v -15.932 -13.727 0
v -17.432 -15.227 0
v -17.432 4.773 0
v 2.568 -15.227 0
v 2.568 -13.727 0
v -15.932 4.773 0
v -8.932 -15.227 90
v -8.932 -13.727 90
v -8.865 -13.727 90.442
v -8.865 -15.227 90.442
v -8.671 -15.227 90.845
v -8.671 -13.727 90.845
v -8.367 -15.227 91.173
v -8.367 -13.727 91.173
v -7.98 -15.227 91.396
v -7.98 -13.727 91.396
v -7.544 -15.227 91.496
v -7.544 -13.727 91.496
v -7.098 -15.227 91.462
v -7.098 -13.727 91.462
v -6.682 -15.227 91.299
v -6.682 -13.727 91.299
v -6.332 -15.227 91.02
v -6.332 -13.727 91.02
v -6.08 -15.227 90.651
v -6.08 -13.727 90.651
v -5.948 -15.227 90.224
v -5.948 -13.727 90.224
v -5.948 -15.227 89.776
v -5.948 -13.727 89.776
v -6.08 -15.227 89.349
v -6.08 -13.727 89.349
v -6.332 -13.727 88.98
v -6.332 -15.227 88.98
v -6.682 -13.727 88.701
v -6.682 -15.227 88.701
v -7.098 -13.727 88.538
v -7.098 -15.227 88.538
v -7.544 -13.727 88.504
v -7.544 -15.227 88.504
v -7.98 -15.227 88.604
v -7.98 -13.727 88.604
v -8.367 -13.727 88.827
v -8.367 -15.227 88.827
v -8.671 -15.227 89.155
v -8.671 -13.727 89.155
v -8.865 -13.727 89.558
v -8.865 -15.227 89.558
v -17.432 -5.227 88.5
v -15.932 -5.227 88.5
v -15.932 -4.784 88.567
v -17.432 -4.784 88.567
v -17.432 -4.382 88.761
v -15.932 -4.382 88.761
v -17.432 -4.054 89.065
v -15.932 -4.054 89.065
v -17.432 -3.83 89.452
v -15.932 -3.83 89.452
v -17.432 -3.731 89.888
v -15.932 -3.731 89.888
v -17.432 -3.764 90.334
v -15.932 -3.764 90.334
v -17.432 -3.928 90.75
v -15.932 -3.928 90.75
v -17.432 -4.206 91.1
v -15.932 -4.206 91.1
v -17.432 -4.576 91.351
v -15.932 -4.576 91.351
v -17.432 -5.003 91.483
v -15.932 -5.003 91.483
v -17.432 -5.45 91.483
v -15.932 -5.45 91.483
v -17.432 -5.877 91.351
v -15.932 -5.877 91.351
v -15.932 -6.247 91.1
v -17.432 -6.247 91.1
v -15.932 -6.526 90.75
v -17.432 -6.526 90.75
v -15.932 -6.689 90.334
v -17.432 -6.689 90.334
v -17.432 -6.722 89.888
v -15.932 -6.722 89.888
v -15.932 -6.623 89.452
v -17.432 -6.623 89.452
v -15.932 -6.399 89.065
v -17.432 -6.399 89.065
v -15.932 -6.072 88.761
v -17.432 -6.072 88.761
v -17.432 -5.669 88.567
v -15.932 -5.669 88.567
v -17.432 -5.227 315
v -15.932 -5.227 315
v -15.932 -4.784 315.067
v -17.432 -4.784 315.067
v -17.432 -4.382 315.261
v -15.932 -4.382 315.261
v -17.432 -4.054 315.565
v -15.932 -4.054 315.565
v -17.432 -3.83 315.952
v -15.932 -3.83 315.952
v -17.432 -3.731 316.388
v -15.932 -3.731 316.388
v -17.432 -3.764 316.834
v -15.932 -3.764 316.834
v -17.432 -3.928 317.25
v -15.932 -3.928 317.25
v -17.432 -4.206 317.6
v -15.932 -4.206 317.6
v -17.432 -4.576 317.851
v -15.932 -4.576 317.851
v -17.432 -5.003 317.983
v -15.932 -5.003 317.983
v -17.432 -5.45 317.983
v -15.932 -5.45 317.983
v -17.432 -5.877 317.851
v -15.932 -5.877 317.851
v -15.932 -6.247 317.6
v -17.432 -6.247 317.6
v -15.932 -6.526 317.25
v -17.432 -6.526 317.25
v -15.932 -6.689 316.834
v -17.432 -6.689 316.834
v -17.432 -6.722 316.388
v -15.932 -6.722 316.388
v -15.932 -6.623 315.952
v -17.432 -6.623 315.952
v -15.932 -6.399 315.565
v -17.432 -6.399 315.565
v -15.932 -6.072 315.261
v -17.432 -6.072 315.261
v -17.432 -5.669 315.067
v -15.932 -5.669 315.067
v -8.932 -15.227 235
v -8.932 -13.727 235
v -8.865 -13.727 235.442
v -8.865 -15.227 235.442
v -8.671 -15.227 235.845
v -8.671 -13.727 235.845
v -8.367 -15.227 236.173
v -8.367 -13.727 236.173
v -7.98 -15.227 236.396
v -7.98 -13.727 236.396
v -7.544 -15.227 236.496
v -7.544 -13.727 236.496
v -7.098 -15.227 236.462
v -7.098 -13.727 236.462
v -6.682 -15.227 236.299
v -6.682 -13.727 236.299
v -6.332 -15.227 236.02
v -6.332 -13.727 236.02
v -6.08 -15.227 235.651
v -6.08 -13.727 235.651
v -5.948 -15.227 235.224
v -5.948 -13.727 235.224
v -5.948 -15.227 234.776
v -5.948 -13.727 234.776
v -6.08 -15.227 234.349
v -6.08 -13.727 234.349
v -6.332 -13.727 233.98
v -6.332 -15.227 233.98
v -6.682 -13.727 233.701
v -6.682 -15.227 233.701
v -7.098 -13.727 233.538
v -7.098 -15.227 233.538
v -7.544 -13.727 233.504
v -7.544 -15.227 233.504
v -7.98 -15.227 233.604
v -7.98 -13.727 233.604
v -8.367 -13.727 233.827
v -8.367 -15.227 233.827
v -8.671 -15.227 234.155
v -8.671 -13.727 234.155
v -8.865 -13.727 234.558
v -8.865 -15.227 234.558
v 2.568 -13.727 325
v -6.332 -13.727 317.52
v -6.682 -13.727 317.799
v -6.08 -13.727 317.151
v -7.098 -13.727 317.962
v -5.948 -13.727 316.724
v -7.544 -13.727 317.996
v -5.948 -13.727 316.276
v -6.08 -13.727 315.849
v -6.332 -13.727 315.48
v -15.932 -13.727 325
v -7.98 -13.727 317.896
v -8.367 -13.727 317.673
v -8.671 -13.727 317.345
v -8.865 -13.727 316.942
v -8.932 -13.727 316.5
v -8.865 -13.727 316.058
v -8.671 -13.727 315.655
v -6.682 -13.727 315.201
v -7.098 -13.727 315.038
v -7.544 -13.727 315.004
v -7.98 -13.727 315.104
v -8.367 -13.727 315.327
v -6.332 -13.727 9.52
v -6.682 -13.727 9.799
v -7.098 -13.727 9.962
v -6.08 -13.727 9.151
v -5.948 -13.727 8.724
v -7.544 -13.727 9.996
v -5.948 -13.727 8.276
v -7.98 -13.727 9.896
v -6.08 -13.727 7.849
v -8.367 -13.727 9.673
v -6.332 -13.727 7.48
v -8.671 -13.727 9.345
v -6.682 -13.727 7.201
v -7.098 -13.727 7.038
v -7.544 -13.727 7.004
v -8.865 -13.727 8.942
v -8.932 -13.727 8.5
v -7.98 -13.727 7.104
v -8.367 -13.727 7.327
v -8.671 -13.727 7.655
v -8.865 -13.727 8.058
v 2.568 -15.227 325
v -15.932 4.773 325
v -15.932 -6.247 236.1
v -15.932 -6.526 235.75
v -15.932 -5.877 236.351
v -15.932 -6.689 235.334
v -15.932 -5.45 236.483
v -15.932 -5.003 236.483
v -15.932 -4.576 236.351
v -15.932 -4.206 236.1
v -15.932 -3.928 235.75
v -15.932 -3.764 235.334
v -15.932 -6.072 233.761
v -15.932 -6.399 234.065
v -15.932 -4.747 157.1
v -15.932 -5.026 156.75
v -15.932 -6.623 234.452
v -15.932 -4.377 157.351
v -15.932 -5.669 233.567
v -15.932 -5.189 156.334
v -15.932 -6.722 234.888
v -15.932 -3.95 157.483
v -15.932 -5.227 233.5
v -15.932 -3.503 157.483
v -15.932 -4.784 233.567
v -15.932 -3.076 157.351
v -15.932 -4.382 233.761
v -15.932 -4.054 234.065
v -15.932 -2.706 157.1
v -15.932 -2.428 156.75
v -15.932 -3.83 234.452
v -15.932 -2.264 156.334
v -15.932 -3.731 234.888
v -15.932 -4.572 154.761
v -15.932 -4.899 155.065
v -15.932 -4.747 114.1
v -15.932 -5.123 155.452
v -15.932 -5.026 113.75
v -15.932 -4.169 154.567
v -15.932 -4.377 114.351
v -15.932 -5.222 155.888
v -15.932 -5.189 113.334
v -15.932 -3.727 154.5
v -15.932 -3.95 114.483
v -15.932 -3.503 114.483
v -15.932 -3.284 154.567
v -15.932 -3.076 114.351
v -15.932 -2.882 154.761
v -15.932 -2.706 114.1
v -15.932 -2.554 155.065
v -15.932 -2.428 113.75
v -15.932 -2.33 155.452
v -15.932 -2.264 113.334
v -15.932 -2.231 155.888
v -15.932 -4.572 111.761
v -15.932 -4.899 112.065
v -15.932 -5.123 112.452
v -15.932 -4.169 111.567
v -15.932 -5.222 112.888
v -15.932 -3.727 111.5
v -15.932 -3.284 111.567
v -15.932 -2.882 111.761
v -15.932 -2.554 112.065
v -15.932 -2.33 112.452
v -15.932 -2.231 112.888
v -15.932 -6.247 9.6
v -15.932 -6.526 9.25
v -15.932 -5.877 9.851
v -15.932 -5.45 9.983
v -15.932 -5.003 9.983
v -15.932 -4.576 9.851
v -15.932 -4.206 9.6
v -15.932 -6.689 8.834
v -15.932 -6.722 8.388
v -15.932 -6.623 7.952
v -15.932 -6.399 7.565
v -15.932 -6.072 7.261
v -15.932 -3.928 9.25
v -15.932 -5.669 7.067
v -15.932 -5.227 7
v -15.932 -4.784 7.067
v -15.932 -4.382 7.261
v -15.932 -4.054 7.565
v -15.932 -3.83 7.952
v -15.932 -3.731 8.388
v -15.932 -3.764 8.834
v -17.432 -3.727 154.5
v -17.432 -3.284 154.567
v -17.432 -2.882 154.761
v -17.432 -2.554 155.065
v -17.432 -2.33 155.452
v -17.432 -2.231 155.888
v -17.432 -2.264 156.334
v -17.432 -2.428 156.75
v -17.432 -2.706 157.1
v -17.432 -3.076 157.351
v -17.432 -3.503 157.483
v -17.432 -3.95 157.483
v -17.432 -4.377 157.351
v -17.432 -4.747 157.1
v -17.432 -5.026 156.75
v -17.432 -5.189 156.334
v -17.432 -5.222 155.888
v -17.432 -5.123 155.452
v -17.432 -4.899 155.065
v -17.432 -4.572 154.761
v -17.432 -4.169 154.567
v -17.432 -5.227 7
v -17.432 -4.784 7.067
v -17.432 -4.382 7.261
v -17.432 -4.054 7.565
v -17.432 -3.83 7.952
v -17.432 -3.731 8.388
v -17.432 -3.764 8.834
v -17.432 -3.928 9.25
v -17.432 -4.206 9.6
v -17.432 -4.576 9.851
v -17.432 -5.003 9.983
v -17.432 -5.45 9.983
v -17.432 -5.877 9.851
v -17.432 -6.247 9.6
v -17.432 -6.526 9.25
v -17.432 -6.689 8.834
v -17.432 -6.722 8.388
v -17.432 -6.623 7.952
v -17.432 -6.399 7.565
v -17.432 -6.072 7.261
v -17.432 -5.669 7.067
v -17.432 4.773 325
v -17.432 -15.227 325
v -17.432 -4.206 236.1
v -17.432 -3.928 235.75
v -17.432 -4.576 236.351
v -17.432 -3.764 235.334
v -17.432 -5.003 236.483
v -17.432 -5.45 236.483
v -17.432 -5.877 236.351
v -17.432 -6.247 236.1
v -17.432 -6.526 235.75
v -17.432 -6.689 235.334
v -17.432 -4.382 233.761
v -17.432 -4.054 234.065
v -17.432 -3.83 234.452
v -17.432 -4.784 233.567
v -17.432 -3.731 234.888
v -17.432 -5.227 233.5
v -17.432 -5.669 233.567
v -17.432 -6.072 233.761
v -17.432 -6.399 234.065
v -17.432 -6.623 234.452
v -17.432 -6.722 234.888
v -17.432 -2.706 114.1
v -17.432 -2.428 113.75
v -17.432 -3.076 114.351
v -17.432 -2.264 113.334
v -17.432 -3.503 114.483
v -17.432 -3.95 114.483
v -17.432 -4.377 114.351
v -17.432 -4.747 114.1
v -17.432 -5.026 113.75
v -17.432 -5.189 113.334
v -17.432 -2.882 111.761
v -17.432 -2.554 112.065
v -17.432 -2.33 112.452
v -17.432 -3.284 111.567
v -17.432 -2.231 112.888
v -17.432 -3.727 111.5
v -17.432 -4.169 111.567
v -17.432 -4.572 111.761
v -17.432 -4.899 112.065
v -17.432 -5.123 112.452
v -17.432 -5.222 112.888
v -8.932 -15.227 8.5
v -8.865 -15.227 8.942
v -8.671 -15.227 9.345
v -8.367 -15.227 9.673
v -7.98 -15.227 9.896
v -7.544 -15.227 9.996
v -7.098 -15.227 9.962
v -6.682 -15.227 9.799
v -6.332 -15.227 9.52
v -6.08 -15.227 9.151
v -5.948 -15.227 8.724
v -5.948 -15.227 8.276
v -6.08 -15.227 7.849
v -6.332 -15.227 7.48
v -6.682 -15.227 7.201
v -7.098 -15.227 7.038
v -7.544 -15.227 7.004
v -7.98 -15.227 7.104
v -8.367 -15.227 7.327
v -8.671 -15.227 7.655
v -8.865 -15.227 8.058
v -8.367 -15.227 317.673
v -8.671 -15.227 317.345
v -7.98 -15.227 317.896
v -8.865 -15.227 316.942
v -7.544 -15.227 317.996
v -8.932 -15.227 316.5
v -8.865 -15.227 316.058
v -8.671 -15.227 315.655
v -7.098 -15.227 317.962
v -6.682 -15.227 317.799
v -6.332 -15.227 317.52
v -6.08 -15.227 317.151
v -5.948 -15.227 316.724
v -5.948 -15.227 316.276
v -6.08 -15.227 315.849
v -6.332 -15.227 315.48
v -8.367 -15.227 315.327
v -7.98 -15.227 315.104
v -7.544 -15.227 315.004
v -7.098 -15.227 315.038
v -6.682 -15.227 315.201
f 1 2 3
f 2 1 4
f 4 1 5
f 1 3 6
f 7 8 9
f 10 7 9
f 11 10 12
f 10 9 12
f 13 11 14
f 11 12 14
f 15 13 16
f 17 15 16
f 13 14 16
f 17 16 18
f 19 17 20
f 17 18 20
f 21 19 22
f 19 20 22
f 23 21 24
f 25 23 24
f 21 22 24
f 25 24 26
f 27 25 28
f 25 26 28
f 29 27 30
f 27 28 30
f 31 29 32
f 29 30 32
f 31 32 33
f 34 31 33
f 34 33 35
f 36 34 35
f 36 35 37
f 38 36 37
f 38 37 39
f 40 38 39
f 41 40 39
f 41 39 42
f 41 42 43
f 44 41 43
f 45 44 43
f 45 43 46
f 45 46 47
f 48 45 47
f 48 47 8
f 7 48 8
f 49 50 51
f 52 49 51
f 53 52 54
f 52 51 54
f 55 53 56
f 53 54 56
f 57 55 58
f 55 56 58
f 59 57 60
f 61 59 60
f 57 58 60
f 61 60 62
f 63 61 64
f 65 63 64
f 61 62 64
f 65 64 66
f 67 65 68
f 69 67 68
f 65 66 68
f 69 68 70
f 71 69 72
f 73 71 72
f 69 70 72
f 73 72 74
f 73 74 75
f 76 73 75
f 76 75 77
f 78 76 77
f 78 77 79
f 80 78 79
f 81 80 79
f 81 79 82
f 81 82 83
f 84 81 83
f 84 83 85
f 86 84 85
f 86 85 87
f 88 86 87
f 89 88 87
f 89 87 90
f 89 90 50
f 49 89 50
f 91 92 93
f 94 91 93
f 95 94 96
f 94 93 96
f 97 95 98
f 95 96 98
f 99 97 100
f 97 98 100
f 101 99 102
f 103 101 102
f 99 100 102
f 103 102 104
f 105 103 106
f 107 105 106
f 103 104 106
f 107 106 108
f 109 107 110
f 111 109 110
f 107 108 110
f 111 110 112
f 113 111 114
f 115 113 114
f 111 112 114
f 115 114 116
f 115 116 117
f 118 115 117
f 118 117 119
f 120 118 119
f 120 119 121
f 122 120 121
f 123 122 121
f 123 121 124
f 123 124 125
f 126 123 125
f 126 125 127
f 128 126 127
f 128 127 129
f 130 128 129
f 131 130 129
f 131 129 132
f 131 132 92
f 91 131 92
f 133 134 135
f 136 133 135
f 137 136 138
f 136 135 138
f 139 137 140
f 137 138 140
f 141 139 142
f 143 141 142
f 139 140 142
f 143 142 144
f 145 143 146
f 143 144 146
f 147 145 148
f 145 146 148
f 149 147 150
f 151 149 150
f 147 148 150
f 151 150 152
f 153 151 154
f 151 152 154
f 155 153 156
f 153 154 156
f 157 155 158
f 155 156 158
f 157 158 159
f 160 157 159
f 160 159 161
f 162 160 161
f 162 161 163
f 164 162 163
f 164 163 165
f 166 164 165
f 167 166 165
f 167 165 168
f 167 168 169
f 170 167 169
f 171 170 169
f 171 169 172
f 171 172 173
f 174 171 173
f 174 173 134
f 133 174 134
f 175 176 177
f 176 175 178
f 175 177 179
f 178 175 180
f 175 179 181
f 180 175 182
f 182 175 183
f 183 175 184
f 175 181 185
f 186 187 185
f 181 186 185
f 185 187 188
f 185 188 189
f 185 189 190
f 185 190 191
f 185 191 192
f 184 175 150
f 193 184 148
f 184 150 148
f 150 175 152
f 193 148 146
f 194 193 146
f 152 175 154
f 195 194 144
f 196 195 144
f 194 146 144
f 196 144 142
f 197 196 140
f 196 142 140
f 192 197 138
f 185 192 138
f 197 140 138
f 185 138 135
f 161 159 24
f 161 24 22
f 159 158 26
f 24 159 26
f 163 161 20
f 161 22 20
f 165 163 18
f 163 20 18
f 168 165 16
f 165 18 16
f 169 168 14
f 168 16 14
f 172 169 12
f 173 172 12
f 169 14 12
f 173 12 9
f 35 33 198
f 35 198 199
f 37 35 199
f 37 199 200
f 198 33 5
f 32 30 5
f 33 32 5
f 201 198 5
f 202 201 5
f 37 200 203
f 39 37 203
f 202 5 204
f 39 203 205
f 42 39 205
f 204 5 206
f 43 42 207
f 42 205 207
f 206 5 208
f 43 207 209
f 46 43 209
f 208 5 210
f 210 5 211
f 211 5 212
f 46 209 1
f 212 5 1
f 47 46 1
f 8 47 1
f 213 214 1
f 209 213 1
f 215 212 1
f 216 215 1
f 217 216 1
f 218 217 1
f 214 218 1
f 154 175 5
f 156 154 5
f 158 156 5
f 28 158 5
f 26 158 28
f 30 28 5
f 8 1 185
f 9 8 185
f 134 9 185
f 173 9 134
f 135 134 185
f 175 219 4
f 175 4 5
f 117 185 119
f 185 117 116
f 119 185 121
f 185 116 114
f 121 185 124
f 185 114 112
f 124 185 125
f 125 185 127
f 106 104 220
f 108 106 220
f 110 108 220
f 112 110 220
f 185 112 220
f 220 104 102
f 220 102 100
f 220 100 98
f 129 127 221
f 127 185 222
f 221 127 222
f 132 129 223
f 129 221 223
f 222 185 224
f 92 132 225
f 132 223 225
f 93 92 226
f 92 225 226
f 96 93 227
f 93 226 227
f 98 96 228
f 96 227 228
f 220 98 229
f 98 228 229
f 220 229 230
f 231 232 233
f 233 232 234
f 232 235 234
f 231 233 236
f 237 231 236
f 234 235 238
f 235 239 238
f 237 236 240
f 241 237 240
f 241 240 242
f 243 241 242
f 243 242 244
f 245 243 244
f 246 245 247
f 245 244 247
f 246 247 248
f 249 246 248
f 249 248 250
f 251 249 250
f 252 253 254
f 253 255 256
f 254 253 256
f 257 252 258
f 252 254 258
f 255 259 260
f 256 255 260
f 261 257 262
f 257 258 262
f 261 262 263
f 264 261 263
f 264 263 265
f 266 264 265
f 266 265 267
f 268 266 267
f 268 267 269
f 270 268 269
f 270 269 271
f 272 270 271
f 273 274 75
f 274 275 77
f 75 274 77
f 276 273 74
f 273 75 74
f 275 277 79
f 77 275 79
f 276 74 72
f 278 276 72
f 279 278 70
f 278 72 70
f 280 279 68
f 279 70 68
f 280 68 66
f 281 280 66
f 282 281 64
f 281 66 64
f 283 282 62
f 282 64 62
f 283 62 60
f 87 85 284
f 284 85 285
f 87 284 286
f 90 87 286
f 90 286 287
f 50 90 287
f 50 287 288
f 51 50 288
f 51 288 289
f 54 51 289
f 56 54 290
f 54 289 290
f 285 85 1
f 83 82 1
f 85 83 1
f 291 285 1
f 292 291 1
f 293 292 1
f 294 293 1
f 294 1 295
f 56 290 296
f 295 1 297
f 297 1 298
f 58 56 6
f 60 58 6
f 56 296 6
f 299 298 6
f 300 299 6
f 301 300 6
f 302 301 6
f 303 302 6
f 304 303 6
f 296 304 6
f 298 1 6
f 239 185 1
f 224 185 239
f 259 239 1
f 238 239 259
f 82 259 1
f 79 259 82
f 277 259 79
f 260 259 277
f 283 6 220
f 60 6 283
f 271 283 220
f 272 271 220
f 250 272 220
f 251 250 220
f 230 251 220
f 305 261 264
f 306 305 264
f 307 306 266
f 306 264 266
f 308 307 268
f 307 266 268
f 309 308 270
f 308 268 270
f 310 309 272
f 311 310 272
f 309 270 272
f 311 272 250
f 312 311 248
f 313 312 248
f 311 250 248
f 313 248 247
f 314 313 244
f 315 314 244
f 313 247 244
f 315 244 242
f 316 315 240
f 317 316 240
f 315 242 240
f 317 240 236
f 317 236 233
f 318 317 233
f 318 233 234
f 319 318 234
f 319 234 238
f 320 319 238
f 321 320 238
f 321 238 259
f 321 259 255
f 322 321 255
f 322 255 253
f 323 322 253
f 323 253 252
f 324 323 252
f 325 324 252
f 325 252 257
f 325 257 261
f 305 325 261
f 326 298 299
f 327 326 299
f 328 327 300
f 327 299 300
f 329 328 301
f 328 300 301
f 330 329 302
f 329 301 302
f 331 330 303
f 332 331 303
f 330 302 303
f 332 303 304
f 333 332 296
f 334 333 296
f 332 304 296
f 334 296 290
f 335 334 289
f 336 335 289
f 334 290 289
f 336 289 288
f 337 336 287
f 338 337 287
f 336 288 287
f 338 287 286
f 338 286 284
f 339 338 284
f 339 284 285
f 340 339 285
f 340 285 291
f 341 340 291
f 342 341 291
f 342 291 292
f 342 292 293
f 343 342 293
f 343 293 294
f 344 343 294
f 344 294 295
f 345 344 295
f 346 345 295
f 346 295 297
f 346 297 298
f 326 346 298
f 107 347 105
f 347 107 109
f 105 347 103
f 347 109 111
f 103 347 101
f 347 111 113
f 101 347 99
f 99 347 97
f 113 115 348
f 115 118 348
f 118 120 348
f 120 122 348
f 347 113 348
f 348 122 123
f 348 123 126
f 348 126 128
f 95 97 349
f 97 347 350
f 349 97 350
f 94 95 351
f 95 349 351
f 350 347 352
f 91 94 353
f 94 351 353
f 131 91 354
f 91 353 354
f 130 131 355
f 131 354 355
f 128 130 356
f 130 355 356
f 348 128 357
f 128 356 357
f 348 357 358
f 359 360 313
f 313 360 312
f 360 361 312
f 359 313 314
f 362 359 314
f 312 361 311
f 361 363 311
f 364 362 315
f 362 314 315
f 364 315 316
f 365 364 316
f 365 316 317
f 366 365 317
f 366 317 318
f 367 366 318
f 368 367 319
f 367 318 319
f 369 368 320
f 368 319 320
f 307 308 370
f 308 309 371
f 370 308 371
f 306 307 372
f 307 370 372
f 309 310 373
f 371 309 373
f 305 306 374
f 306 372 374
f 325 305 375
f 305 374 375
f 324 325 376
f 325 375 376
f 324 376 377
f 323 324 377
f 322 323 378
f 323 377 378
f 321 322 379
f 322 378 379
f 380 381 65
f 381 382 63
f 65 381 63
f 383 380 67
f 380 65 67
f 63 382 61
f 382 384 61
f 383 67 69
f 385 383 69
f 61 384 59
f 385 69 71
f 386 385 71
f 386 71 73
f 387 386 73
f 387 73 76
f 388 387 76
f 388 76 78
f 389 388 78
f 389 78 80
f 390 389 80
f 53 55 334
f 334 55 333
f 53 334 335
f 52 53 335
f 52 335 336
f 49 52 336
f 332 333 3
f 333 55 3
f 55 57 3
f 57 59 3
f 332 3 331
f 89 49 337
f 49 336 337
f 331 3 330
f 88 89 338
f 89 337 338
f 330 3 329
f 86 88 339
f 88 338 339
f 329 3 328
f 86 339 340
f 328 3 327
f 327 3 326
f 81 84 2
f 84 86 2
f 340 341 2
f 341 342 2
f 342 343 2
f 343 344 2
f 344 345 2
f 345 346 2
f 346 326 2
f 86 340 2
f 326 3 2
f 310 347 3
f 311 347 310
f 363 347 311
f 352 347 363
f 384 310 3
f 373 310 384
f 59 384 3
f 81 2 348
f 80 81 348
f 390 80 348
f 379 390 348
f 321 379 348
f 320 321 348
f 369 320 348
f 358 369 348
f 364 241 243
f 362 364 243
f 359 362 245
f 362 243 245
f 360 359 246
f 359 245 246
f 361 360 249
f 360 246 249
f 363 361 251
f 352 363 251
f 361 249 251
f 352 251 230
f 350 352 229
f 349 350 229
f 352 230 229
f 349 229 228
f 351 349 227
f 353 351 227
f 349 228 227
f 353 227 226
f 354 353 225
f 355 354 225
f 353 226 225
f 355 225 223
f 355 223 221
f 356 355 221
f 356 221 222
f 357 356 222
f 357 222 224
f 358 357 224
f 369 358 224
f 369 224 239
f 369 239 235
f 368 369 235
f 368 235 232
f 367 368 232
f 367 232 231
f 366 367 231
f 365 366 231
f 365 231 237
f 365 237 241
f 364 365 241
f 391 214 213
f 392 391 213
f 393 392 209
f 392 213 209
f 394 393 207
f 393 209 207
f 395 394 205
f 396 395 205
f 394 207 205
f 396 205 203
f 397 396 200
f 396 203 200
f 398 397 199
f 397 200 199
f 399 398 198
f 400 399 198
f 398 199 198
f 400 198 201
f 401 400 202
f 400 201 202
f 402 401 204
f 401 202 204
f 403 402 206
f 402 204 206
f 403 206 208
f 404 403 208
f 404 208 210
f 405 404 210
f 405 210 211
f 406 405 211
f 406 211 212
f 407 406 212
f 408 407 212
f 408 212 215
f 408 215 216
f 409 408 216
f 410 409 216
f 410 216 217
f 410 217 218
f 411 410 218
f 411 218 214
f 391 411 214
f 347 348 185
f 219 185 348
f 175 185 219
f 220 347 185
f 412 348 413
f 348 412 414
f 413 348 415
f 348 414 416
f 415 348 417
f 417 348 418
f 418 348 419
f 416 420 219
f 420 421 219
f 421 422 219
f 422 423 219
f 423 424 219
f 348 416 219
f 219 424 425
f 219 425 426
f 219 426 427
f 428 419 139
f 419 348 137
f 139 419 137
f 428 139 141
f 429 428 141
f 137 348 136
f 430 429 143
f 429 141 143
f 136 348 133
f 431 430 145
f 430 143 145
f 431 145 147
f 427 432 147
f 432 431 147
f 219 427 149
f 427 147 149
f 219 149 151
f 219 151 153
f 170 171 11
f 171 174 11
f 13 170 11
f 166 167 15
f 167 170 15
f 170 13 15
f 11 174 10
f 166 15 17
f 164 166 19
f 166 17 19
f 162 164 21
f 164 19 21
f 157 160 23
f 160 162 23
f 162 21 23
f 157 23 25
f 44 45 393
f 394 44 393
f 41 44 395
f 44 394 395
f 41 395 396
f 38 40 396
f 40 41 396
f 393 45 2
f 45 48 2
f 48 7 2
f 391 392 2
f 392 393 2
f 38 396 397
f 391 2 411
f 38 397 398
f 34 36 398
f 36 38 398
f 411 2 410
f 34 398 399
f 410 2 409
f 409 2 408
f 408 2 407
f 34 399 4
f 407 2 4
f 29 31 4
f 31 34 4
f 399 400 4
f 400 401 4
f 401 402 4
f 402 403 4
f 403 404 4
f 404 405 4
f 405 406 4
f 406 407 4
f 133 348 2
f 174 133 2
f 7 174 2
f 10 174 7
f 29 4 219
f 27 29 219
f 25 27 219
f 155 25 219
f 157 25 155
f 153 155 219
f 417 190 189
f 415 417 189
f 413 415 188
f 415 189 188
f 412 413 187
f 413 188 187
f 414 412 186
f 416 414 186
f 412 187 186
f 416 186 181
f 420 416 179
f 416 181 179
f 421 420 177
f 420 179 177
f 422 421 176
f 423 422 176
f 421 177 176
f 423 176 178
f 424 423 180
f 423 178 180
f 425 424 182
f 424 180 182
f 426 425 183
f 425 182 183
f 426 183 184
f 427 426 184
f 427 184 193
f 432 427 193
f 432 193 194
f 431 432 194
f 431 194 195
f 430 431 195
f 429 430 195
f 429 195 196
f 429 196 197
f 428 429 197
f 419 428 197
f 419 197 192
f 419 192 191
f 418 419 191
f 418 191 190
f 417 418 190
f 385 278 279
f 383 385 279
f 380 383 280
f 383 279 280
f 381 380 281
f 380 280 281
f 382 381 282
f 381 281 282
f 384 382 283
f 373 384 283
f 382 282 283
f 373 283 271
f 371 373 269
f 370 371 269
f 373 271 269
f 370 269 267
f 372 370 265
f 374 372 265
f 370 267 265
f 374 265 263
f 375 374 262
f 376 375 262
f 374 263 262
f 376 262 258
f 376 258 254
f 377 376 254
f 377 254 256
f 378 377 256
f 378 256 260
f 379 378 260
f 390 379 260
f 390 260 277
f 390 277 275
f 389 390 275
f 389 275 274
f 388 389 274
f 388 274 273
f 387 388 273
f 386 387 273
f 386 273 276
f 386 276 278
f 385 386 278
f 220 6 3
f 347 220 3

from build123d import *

# Parameters (mm, degrees)
EXTRUSION1_DEPTH = 325
ESQUISSE2_R      = 1.5
EXTRUSION2_DEPTH = 300
ESQUISSE3_R      = 1.5
EXTRUSION3_DEPTH = 300


with BuildPart() as part:
    # Esquisse1 → Extrusion1 (new body)
    with BuildSketch(Plane.XY):
        Polygon((-17.43168638, 4.773368421), (-17.43168638, -15.226631579), (2.56831362, -15.226631579), (2.56831362, -13.726631579), (-15.93168638, -13.726631579), (-15.93168638, 4.773368421), align=None)
    extrude(amount=EXTRUSION1_DEPTH)

    # Esquisse2 → Extrusion2 (cut)
    with BuildSketch(Plane(origin=(0, -13.726631579, 0), x_dir=(-1, 0, 0), z_dir=(0, 1, 0))):
        with Locations((7.43168638, 8.5)):
            Circle(ESQUISSE2_R)
        with Locations((7.43168638, 316.5)):
            Circle(ESQUISSE2_R)
        with Locations((7.43168638, 235)):
            Circle(ESQUISSE2_R)
        with Locations((7.43168638, 90)):
            Circle(ESQUISSE2_R)
    extrude(amount=-EXTRUSION2_DEPTH, mode=Mode.SUBTRACT)

    # Esquisse3 → Extrusion3 (cut)
    with BuildSketch(Plane(origin=(-15.93168638, 0, 0), x_dir=(0, 0, -1), z_dir=(1, 0, 0))):
        with Locations((-316.5, -5.226631579)):
            Circle(ESQUISSE3_R)
        with Locations((-8.5, -5.226631579)):
            Circle(ESQUISSE3_R)
        with Locations((-235, -5.226631579)):
            Circle(ESQUISSE3_R)
        with Locations((-90, -5.226631579)):
            Circle(ESQUISSE3_R)
        with Locations((-113, -3.726631579)):
            Circle(ESQUISSE3_R)
        with Locations((-156, -3.726631579)):
            Circle(ESQUISSE3_R)
    extrude(amount=-EXTRUSION3_DEPTH, mode=Mode.SUBTRACT)


solid = part.part
